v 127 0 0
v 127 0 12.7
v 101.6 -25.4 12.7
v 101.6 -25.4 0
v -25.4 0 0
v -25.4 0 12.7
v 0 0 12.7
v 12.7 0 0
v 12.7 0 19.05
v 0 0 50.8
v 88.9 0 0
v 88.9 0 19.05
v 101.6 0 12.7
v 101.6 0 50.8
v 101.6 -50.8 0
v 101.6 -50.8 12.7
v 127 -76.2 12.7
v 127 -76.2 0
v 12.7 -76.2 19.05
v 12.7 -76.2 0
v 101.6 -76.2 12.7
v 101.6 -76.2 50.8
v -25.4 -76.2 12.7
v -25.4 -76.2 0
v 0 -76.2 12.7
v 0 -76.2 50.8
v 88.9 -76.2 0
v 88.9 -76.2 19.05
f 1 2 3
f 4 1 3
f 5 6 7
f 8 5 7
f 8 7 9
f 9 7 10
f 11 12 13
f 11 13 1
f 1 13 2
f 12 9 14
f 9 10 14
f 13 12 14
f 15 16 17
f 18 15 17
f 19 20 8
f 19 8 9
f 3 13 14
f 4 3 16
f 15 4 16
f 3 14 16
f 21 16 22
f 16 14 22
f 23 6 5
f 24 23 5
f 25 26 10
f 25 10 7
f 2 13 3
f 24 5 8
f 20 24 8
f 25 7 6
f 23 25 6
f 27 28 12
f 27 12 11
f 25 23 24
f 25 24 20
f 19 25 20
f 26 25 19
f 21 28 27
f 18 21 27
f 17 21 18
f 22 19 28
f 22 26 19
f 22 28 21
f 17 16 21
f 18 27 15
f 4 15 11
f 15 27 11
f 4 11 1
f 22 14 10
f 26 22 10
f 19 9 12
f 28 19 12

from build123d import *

# Parameters (mm, degrees)
F1_DEPTH = 76.2
F0_W     = 25.4
F0_H     = 12.7
F2_DEPTH = 76.2
F4_DEPTH = 25.4


with BuildPart() as f1:
    # F0 (on Front) → F1 (new body)
    with BuildSketch(Plane.XZ):
        Polygon((-25.4, 0), (0, 0), (12.7, 0), (12.7, 19.05), (88.9, 19.05), (88.9, 0), (101.6, 0), (101.6, 12.7), (101.6, 50.8), (0, 50.8), (0, 12.7), (-25.4, 12.7), align=None)
    extrude(amount=F1_DEPTH)

    # F0 (on Front) → F2 (join)
    with BuildSketch(Plane.XZ):
        with Locations((114.3, 6.35)):
            Rectangle(F0_W, F0_H)
    extrude(amount=F2_DEPTH)

    # F3 (on face) → F4 (cut)
    with BuildSketch(Plane.XY.offset(12.7)):
        Polygon((101.6, -25.4), (101.6, -50.8), (127, -76.2), (127, 0), align=None)
    extrude(amount=-F4_DEPTH, mode=Mode.SUBTRACT)


solid = f1.part
